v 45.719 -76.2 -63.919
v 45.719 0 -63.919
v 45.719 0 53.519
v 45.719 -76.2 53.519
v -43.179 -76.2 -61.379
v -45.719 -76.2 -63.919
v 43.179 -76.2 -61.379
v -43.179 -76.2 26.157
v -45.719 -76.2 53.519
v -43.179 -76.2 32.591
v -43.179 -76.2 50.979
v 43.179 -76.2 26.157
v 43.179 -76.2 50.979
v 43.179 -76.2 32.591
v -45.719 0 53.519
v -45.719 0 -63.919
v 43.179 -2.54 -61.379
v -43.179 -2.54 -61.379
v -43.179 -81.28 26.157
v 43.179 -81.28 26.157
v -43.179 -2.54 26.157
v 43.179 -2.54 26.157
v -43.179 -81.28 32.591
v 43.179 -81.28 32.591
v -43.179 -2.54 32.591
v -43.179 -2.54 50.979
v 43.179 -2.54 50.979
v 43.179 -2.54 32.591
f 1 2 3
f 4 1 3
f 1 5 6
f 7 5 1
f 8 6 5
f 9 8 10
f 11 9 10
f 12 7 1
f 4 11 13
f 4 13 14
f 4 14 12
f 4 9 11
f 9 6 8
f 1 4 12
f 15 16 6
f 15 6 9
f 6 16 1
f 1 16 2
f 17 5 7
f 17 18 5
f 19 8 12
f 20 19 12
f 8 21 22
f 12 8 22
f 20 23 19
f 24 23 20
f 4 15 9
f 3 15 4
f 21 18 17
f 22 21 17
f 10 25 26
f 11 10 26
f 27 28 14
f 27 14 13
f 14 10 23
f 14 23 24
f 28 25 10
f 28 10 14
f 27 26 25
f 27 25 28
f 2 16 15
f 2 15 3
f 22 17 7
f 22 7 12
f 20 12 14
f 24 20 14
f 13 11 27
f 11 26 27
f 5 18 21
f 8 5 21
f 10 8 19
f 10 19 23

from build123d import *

# Parameters (mm, degrees)
F0_W     = 91.437164
F0_H     = 117.438275
F1_DEPTH = 76.2
F2_T     = -2.54
F3_W     = 86.357164
F3_H     = 6.434369
F4_DEPTH = 78.74


with BuildPart() as f1:
    # F0 (on Front) → F1 (new body)
    with BuildSketch(Plane.XZ):
        with Locations((2e-06, -5.200221)):
            Rectangle(F0_W, F0_H)
    extrude(amount=F1_DEPTH)

    # F2
    f2_openings = [f1.faces().sort_by_distance(p)[0] for p in [
        (2e-06, -76.2, -5.20022),
    ]]
    offset(amount=F2_T, openings=f2_openings)

    # F3 (on face) → F4 (join)
    with BuildSketch(Plane.XZ.offset(2.54)):
        with Locations((2e-06, 29.374299)):
            Rectangle(F3_W, F3_H)
    extrude(amount=F4_DEPTH)


solid = f1.part
